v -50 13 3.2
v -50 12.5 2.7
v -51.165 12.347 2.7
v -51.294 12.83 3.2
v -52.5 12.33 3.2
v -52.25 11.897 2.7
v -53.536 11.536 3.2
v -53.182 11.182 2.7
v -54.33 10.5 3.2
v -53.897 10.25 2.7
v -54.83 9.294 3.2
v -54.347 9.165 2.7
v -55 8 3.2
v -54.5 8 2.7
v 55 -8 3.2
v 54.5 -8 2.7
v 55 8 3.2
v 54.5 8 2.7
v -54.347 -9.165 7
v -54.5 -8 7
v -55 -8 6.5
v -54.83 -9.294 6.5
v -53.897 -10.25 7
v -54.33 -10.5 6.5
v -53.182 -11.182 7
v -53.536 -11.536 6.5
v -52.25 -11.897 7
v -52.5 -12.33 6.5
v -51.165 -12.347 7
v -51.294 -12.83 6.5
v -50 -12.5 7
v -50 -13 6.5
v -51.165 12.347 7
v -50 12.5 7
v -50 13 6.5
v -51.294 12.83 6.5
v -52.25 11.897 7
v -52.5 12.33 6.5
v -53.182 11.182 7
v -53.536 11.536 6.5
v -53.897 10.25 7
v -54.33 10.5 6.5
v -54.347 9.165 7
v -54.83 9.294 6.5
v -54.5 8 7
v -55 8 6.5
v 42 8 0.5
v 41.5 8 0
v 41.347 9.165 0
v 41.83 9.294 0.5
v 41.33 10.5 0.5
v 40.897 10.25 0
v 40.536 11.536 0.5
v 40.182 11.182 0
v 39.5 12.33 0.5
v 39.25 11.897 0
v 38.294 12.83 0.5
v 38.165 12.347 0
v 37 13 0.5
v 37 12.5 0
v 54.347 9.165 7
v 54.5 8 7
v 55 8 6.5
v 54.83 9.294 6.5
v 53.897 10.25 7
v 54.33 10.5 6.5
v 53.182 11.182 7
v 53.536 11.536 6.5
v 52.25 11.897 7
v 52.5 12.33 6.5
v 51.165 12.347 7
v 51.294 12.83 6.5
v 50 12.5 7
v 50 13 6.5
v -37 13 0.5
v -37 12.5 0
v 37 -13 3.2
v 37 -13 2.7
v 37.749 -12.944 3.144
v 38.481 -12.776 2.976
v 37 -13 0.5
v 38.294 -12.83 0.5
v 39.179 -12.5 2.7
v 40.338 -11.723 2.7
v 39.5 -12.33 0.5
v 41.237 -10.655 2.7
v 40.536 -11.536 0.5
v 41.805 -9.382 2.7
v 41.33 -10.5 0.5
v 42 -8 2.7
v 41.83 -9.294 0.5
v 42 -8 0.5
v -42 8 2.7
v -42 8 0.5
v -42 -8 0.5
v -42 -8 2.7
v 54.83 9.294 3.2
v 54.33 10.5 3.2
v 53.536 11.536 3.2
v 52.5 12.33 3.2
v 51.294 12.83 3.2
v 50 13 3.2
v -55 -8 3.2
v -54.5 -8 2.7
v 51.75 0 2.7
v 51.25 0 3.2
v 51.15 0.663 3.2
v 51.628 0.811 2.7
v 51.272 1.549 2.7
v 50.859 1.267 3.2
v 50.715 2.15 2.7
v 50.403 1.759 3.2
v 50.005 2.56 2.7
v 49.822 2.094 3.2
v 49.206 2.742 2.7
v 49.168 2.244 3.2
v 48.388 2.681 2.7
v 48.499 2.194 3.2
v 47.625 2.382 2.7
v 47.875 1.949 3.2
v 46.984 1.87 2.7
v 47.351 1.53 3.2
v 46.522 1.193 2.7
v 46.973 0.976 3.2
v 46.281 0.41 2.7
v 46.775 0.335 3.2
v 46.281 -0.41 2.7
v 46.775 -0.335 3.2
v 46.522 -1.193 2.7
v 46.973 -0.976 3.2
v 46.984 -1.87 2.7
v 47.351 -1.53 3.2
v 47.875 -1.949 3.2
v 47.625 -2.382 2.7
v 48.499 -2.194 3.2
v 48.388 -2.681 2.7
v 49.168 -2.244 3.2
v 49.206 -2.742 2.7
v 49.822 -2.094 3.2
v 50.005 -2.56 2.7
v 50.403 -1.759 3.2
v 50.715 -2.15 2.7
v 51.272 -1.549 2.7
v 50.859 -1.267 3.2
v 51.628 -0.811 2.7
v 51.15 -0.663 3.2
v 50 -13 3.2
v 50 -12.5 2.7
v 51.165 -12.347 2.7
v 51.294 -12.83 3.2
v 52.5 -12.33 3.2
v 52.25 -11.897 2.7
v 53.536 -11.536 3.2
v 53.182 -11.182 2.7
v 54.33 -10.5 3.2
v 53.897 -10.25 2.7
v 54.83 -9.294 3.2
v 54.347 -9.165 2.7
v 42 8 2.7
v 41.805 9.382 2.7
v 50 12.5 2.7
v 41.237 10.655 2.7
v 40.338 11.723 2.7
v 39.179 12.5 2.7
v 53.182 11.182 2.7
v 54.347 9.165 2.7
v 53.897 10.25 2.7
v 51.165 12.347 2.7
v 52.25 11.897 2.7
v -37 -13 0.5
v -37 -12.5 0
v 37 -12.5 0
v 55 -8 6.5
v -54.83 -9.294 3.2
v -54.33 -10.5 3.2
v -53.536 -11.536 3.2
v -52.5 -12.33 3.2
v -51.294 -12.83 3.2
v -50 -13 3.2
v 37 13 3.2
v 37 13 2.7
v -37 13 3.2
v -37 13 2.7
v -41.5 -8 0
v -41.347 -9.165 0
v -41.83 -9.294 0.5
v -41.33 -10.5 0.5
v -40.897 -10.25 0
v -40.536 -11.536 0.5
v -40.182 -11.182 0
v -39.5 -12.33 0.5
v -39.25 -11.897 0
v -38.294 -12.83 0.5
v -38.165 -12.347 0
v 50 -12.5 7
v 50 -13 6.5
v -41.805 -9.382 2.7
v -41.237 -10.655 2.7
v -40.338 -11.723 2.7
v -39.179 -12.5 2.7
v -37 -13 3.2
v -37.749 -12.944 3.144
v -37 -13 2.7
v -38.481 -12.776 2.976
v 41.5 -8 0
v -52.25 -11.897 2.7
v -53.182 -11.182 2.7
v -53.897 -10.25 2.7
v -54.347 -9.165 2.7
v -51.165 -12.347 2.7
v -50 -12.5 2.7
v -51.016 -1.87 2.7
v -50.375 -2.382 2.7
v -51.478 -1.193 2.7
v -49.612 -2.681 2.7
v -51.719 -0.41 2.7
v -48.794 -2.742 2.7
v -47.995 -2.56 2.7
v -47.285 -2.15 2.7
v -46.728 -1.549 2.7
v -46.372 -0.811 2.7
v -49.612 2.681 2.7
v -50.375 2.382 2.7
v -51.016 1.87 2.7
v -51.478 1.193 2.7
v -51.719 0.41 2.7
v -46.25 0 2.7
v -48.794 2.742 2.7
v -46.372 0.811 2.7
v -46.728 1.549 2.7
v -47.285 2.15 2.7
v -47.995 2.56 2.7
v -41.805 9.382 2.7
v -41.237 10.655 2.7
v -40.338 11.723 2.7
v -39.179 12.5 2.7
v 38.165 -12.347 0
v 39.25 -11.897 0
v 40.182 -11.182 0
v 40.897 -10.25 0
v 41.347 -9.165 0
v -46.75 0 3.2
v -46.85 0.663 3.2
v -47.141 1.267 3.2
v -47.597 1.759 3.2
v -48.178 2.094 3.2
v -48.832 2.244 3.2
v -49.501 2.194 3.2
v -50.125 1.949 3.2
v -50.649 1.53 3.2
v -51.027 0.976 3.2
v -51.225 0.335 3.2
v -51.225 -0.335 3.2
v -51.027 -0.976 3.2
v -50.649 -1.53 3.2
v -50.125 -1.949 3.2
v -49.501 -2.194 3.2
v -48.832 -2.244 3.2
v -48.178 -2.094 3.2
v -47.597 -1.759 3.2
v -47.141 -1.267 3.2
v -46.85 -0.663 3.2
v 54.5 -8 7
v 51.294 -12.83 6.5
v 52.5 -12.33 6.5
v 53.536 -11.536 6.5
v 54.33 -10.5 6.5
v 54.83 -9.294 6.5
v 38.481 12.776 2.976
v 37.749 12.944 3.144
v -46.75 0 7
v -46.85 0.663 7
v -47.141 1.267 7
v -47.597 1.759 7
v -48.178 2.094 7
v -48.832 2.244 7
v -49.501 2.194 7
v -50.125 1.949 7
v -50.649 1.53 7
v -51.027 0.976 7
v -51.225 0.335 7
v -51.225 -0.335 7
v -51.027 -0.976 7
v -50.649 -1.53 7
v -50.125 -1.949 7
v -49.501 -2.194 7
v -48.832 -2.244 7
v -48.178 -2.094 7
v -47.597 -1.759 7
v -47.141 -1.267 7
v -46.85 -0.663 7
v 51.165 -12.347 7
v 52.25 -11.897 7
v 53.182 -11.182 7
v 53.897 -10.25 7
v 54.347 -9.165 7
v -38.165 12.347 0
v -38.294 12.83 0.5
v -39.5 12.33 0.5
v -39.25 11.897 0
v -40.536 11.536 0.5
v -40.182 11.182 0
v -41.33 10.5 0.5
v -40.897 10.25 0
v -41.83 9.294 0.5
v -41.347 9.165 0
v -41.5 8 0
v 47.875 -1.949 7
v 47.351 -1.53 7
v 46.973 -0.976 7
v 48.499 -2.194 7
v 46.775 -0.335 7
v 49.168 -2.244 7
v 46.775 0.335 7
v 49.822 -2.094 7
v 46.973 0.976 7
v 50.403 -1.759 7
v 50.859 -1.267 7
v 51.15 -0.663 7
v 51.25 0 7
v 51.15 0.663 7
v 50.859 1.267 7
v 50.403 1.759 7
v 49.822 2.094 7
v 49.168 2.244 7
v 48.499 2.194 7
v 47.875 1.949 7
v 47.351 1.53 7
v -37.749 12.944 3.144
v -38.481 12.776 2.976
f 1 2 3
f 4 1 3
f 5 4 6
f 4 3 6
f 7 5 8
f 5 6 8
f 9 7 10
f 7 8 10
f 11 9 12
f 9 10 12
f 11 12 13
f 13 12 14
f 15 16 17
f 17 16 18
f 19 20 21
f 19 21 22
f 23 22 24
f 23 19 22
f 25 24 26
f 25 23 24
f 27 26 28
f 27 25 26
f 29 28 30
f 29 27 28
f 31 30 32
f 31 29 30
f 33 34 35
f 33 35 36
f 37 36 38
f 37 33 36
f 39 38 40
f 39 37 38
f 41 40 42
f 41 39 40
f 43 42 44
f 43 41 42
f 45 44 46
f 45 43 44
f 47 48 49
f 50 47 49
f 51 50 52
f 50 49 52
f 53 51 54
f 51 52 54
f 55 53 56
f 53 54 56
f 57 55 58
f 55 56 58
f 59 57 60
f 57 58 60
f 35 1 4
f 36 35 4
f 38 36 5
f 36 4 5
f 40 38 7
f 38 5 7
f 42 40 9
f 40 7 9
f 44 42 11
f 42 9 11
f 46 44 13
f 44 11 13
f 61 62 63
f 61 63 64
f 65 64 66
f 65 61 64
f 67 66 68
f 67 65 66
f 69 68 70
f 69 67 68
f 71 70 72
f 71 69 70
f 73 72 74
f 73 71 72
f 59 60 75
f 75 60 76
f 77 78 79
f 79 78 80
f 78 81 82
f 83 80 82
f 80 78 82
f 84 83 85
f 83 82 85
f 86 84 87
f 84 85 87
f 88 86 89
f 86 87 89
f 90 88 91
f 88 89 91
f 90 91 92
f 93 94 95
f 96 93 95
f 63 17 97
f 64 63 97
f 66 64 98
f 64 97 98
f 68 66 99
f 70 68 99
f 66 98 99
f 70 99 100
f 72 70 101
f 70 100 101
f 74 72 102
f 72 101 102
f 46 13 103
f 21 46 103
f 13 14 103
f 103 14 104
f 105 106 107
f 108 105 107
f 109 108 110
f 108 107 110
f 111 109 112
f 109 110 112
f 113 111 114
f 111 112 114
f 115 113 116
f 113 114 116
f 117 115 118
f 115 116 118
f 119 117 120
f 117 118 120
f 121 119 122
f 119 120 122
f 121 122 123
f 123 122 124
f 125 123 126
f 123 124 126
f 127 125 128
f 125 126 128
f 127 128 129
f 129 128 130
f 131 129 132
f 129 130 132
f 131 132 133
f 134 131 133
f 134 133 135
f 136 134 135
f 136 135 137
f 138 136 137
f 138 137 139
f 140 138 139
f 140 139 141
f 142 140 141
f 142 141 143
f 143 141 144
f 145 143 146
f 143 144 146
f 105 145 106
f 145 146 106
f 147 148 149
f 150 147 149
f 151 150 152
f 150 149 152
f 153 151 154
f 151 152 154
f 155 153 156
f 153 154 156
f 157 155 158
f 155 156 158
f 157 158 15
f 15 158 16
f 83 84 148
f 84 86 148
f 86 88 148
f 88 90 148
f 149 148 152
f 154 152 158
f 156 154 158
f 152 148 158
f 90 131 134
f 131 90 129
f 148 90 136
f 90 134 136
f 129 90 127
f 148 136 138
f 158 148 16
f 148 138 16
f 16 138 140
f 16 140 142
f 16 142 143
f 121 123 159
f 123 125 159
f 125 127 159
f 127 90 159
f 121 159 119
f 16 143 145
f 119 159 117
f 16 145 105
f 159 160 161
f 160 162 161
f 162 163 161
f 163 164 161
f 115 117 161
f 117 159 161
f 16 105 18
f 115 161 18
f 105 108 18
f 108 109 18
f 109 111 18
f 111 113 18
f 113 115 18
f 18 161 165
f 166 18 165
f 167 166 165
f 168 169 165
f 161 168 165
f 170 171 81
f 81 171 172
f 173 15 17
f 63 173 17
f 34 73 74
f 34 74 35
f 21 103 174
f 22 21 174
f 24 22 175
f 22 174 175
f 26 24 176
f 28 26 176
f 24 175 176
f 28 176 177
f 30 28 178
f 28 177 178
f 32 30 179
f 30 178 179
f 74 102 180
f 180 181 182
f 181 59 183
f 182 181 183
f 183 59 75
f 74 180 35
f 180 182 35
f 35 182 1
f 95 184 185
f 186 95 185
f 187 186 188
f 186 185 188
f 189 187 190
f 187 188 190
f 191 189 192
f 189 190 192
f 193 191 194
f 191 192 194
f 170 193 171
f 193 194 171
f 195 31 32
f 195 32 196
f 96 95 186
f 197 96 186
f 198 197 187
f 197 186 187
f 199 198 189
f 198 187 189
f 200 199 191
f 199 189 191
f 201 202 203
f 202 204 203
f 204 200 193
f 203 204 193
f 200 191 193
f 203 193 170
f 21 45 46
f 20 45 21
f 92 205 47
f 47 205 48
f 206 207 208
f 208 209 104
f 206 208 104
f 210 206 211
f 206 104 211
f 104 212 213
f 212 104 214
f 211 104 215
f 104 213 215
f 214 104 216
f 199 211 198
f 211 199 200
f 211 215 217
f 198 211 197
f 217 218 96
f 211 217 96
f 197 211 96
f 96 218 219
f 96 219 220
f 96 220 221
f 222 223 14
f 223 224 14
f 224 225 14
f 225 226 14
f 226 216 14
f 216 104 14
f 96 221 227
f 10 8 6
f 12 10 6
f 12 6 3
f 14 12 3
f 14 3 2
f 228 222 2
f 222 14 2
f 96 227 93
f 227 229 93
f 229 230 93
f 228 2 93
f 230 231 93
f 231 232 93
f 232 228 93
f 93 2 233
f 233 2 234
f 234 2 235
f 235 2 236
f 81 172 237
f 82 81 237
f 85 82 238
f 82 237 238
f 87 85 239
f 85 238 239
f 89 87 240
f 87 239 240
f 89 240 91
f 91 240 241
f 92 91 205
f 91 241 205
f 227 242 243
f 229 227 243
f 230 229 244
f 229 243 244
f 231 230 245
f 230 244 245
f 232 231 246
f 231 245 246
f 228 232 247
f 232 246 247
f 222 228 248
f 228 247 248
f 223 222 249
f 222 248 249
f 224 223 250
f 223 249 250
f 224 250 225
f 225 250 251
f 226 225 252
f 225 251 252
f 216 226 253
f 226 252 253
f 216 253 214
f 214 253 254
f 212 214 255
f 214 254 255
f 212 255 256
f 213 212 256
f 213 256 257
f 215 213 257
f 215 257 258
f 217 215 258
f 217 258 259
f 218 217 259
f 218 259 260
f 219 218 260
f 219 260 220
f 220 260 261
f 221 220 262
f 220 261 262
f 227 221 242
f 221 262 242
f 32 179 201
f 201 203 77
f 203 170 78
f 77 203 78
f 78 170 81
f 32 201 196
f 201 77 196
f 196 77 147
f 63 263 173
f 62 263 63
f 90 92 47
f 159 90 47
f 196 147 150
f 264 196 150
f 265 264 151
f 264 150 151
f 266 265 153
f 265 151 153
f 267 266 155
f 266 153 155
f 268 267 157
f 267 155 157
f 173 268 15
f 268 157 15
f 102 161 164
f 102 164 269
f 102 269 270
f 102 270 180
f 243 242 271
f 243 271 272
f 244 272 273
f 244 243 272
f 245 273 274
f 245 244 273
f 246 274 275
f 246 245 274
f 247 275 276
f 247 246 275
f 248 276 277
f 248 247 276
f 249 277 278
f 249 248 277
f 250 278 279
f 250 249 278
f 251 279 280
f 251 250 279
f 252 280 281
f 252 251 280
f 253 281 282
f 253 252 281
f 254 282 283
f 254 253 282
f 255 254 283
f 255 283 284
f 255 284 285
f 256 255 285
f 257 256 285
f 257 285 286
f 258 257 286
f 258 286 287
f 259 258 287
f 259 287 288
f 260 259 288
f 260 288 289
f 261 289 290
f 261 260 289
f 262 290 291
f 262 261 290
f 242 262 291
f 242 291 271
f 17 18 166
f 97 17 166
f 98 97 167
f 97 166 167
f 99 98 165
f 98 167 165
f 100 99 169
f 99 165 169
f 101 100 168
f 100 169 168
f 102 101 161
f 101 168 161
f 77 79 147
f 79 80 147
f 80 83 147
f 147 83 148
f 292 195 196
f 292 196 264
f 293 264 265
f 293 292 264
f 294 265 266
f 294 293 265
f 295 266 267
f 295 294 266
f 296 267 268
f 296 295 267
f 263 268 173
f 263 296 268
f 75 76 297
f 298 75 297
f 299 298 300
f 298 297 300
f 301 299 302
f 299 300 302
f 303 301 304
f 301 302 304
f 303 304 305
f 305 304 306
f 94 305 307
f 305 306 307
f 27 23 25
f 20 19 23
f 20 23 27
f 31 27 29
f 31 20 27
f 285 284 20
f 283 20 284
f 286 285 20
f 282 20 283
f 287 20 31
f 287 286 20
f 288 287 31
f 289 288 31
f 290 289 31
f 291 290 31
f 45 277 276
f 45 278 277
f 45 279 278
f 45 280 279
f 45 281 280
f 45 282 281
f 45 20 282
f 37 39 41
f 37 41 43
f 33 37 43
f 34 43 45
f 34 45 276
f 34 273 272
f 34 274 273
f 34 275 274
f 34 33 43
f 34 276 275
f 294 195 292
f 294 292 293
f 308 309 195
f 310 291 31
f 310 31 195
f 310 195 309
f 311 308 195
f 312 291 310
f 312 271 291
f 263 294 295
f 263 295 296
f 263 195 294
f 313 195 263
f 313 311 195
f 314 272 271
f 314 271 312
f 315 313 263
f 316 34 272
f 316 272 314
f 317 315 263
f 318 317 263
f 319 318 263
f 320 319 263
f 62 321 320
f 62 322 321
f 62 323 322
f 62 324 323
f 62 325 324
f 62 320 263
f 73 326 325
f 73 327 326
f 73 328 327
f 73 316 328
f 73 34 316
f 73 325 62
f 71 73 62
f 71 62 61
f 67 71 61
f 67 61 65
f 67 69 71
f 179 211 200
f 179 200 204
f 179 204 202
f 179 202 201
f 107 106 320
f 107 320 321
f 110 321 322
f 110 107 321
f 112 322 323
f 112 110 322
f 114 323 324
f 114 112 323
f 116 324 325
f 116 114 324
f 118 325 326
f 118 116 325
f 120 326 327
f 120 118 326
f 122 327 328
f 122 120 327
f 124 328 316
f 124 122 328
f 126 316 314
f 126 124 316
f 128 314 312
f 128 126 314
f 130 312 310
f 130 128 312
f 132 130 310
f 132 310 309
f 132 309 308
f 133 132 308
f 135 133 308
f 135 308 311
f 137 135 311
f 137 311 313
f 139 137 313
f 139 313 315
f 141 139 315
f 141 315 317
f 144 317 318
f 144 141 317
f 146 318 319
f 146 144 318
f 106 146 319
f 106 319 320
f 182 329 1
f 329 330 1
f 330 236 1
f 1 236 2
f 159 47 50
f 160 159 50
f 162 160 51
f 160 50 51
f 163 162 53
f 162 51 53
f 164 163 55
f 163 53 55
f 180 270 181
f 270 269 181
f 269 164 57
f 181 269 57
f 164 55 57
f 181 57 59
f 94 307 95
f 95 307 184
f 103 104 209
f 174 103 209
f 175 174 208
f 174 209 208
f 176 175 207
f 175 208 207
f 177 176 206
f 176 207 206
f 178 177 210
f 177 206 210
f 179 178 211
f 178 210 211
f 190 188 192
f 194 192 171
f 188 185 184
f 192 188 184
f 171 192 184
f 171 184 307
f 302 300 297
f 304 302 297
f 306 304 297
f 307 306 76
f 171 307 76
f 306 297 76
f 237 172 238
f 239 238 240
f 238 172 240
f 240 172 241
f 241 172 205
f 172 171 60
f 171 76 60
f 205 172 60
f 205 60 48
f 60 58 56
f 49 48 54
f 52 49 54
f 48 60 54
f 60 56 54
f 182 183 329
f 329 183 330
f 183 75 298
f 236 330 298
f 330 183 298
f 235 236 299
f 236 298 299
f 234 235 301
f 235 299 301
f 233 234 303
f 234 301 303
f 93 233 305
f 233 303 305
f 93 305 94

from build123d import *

# Parameters (mm, degrees)
F1_DEPTH = 2.7
F3_R     = 2.25
F4_DEPTH = 4.3
F5_SIZE  = 0.5


with BuildPart() as f1:
    # F0 (on Top) → F1 (new body)
    with BuildSketch(Plane.XY):
        with BuildLine():
            Line((37, 13), (-37, 13))
            ThreePointArc((-37, 13), (-40.535534, 11.535534), (-42, 8))
            Line((-42, 8), (-42, -8))
            ThreePointArc((-42, -8), (-40.535534, -11.535534), (-37, -13))
            Line((-37, -13), (37, -13))
            ThreePointArc((37, -13), (40.535534, -11.535534), (42, -8))
            Line((42, -8), (42, 8))
            ThreePointArc((42, 8), (40.535534, 11.535534), (37, 13))
        make_face()
    extrude(amount=F1_DEPTH)

    # F3 (on face) → F4 (join, through all)
    with BuildSketch(Plane.XY.offset(2.7)):
        with BuildLine():
            Line((37, 13), (-37, 13))
            ThreePointArc((-37, 13), (-40.535534, 11.535534), (-42, 8))
            Line((-42, 8), (-42, -8))
            ThreePointArc((-42, -8), (-40.535534, -11.535534), (-37, -13))
            Line((-37, -13), (37, -13))
            ThreePointArc((37, -13), (40.535534, -11.535534), (42, -8))
            Line((42, -8), (42, 8))
            ThreePointArc((42, 8), (40.535534, 11.535534), (37, 13))
        make_face()
        with BuildLine():
            Line((50, 13), (37, 13))
            ThreePointArc((37, 13), (40.535534, 11.535534), (42, 8))
            Line((42, 8), (42, -8))
            ThreePointArc((42, -8), (40.535534, -11.535534), (37, -13))
            Line((37, -13), (50, -13))
            ThreePointArc((50, -13), (53.535534, -11.535534), (55, -8))
            Line((55, -8), (55, 8))
            ThreePointArc((55, 8), (53.535534, 11.535534), (50, 13))
        make_face()
        with Locations((49, 0)):
            Circle(F3_R, mode=Mode.SUBTRACT)
        with BuildLine():
            Line((-37, 13), (-50, 13))
            ThreePointArc((-50, 13), (-53.535534, 11.535534), (-55, 8))
            Line((-55, 8), (-55, -8))
            ThreePointArc((-55, -8), (-53.535534, -11.535534), (-50, -13))
            Line((-50, -13), (-37, -13))
            ThreePointArc((-37, -13), (-40.535534, -11.535534), (-42, -8))
            Line((-42, -8), (-42, 8))
            ThreePointArc((-42, 8), (-40.535534, 11.535534), (-37, 13))
        make_face()
        with Locations((-49, 0)):
            Circle(F3_R, mode=Mode.SUBTRACT)
    extrude(amount=F4_DEPTH)

    # F5
    f5_edges = [f1.edges().sort_by_distance(p)[0] for p in [
        (0, -13, 0),
        (46.75, 0, 2.7),
        (-51.25, 0, 2.7),
        (43.5, 13, 2.7),
        (-43.5, 13, 2.7),
        (0, 13, 7),
    ]]
    chamfer(f5_edges, length=F5_SIZE)


solid = f1.part
